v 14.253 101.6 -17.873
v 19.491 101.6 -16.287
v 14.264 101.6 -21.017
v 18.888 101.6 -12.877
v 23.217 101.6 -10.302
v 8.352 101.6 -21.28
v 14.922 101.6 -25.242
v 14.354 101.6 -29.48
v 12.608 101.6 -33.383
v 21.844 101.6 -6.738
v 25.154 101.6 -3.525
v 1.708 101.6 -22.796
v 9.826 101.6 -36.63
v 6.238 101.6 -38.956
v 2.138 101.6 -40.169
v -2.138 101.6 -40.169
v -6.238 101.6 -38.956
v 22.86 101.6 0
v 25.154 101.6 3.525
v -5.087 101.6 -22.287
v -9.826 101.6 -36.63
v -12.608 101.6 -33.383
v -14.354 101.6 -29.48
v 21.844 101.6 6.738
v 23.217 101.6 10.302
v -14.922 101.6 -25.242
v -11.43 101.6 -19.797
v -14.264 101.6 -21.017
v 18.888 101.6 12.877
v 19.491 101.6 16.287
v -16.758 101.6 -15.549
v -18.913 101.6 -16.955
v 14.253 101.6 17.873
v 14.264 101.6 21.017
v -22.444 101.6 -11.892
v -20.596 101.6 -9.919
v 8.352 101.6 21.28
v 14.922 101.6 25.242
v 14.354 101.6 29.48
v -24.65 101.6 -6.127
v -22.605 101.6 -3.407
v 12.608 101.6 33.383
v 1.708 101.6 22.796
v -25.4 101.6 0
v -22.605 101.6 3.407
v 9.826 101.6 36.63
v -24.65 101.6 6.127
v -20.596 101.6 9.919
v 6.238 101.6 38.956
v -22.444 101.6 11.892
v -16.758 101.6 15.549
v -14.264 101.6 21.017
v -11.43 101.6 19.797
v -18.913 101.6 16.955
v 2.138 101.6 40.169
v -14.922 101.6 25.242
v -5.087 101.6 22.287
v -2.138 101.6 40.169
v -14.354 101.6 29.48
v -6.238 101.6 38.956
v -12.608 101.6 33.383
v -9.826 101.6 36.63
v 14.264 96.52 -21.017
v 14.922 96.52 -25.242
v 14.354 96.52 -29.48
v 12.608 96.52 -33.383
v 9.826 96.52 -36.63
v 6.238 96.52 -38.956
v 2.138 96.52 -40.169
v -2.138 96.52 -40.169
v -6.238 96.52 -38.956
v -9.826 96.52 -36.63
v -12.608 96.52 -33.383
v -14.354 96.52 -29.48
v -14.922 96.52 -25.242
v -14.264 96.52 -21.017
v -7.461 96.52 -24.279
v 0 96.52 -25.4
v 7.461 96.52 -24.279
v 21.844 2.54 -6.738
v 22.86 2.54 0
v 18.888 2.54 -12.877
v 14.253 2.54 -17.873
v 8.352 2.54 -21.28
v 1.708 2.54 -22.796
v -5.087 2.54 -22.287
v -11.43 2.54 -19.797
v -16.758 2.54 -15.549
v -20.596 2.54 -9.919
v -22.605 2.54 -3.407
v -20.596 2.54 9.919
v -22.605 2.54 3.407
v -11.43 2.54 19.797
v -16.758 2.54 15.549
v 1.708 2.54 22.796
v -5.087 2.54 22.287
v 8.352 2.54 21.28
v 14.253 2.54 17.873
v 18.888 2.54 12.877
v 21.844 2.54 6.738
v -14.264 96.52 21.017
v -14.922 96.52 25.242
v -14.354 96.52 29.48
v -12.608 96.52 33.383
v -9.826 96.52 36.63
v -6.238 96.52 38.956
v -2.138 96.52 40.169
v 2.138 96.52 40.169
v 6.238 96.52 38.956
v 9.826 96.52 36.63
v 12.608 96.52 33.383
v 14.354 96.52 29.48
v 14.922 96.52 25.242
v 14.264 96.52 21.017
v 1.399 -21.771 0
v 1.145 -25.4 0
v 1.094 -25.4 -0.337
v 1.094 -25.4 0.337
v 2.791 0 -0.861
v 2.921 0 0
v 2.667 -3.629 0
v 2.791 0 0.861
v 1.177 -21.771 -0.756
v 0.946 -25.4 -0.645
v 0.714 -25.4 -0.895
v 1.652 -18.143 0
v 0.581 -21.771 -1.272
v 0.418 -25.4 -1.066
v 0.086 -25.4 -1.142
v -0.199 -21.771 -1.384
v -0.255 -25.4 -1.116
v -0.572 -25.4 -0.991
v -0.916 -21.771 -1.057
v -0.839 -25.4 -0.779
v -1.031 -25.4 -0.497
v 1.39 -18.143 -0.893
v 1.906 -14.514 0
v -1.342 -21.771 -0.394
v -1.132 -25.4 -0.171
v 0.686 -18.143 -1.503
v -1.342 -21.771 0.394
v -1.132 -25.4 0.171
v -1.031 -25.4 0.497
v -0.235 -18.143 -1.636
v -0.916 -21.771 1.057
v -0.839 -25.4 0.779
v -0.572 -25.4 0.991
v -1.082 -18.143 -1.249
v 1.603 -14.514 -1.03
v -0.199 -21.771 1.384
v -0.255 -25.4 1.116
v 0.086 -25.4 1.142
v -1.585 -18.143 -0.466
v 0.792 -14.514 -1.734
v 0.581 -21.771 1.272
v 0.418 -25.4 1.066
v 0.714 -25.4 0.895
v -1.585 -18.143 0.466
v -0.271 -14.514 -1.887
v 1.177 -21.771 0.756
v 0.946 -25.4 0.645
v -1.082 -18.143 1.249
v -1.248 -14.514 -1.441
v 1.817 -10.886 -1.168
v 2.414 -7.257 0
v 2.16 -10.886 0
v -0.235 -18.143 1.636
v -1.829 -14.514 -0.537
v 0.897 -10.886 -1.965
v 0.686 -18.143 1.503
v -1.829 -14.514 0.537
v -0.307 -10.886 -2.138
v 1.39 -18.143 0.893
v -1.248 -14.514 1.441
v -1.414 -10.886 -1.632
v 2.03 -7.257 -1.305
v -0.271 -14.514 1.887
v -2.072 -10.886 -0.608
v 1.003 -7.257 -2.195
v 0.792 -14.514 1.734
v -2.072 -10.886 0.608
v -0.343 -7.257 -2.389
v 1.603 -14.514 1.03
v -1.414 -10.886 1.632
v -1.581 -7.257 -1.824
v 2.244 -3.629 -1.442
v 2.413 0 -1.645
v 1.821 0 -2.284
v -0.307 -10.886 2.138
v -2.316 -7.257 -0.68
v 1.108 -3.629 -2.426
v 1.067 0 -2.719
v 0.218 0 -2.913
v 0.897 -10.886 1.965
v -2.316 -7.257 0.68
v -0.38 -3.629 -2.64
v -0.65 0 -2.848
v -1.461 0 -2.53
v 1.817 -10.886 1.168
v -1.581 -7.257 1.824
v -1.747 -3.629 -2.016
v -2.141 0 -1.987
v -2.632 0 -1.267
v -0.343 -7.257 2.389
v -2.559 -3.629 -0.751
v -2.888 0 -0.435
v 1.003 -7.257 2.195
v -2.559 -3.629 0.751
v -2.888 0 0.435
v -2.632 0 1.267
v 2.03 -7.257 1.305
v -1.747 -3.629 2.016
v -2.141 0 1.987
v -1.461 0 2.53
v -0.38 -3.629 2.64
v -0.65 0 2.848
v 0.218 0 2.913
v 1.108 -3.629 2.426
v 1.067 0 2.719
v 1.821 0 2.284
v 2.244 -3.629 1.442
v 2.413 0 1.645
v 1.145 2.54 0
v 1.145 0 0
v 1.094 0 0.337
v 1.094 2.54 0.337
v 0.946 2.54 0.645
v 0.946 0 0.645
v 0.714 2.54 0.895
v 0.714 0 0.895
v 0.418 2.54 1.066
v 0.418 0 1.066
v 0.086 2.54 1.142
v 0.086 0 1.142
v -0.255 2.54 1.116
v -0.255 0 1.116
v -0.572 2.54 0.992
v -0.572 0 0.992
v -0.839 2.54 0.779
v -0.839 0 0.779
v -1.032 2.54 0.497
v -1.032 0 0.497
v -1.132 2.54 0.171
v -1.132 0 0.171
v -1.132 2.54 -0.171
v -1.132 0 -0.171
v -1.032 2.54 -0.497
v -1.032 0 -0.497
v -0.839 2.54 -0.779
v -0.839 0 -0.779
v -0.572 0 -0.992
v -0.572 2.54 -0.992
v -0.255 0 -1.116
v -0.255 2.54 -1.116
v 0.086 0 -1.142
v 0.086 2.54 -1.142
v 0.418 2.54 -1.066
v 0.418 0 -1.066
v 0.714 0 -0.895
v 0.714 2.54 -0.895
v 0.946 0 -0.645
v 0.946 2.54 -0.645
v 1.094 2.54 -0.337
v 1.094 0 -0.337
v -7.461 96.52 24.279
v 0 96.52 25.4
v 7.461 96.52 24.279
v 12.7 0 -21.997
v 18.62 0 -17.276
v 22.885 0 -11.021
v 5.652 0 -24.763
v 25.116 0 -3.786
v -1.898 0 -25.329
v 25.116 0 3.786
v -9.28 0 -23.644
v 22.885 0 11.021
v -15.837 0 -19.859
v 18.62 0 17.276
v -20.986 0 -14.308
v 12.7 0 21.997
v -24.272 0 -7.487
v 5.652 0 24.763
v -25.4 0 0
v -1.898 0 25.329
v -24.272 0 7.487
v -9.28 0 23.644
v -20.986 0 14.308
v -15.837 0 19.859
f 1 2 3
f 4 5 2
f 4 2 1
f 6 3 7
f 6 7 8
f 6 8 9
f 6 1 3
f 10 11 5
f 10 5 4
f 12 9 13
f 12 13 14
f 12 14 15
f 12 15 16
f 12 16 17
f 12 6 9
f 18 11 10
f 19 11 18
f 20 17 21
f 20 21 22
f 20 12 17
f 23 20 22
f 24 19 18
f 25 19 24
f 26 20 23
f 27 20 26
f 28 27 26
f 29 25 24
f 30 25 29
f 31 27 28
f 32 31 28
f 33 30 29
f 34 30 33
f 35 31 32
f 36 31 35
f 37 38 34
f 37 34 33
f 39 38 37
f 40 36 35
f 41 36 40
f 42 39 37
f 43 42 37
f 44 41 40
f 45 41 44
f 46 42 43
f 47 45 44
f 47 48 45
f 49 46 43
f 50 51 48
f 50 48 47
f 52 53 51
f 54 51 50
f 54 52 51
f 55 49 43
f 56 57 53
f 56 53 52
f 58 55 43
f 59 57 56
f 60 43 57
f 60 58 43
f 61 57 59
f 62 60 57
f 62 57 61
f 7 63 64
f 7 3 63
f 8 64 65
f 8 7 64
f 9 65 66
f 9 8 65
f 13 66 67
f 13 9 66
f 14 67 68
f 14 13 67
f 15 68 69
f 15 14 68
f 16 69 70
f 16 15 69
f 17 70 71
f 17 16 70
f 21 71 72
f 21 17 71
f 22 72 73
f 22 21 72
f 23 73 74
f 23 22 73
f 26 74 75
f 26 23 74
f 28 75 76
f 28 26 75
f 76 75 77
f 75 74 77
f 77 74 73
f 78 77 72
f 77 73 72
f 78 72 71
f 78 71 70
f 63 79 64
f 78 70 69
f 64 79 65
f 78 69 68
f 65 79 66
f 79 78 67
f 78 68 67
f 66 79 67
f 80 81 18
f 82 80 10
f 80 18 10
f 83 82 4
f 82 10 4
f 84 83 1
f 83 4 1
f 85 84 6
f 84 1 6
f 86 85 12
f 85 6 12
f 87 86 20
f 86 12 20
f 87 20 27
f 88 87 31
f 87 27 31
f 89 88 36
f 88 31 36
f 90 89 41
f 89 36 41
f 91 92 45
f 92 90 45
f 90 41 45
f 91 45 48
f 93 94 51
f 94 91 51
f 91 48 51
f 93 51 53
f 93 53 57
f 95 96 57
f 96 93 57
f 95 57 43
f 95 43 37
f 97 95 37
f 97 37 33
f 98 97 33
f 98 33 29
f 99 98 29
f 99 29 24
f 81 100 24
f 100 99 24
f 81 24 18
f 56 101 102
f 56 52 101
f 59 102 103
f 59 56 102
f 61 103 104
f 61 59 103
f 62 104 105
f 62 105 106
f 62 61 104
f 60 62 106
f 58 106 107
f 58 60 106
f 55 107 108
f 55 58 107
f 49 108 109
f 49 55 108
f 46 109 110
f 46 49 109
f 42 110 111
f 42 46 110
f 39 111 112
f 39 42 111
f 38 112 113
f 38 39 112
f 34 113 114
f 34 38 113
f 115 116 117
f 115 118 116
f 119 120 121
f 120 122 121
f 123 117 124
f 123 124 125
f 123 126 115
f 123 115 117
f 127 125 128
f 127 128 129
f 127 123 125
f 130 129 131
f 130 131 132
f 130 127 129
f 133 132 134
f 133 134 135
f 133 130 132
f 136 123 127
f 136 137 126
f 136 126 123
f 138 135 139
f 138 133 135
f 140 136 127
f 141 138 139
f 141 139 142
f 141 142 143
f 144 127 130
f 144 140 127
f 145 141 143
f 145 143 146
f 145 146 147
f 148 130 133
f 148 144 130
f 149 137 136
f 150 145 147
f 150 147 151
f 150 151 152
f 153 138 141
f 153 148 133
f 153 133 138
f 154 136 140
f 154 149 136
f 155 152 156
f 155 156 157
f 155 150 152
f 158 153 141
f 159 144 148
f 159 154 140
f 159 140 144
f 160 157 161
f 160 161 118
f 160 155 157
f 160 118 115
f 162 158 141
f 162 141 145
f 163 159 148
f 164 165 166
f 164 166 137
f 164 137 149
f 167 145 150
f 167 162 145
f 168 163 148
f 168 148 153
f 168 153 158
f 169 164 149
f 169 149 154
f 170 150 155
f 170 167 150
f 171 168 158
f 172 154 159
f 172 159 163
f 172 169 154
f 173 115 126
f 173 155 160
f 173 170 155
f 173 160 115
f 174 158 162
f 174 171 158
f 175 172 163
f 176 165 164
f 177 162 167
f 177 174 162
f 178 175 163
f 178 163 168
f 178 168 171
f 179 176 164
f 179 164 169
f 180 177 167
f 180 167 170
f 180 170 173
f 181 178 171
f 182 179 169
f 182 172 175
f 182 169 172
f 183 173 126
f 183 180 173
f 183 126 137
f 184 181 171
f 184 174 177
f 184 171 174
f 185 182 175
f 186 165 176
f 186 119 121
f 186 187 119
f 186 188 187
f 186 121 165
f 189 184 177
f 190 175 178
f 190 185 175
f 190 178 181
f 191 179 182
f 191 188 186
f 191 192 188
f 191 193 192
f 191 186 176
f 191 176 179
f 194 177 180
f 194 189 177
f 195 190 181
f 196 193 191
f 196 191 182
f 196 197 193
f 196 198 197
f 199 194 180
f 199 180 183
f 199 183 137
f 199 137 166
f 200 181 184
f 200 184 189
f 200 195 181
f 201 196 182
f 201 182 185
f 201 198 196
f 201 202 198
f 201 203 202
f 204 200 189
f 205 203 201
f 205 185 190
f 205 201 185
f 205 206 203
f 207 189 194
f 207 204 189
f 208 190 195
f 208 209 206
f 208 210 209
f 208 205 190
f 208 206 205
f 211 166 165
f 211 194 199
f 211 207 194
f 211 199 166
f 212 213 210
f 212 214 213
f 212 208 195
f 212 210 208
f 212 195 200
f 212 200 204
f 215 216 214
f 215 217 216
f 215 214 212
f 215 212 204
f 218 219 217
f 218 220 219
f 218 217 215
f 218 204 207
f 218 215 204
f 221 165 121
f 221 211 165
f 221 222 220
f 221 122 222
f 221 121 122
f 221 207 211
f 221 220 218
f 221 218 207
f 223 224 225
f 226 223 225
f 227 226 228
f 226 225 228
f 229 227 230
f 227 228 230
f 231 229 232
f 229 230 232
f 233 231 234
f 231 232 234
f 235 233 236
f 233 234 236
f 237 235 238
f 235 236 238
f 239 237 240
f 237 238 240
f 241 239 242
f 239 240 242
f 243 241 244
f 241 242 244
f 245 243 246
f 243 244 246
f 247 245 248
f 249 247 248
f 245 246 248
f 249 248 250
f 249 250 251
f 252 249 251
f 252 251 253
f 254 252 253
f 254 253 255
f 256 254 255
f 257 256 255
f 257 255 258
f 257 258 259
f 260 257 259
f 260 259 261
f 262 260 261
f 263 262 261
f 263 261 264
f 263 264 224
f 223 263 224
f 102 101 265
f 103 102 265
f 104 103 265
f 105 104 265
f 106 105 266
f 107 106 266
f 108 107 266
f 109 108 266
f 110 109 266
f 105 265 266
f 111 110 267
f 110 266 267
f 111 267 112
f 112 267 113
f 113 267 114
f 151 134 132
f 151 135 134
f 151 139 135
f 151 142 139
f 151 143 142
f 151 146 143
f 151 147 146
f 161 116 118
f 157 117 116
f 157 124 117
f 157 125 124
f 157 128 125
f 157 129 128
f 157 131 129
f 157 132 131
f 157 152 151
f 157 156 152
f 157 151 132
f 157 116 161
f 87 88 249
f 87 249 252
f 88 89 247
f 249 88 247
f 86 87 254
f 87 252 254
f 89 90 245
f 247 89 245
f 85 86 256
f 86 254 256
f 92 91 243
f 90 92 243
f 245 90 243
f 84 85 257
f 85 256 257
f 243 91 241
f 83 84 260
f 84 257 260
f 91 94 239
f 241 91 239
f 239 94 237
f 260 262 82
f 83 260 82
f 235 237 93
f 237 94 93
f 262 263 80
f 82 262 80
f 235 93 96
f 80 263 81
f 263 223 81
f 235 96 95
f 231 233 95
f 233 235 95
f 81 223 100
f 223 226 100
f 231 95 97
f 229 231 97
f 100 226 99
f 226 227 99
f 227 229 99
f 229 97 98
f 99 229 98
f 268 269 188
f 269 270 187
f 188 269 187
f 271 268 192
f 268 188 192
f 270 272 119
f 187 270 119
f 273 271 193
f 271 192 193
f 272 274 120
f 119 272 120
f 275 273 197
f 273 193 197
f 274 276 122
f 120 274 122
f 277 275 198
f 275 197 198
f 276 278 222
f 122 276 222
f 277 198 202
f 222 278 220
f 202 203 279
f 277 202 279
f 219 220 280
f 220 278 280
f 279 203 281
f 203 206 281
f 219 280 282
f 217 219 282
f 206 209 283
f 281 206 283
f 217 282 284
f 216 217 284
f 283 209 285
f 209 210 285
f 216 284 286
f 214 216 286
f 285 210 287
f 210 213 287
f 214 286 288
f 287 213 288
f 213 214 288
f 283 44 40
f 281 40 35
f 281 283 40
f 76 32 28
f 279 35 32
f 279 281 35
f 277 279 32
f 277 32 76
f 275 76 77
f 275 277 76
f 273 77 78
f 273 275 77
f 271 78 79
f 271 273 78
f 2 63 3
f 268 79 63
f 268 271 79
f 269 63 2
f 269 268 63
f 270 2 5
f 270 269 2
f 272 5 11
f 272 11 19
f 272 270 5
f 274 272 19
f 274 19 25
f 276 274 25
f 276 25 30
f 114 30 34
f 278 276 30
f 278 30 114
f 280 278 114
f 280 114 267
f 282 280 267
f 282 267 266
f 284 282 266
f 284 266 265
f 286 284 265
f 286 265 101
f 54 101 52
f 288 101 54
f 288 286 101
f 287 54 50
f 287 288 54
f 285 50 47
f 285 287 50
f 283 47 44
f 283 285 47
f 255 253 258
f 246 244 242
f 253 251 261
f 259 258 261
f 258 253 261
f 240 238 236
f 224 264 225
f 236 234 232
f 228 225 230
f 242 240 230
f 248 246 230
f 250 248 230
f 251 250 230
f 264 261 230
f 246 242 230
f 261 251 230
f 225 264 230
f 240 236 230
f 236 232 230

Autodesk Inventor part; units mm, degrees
ref_plane "YZ Plane" through (0, 0, 0) normal (1, 0, 0) x (0, 1, 0)
ref_plane "XZ Plane" through (0, 0, 0) normal (0, 1, 0) x (-1, 0, 0)
ref_plane "XY Plane" through (0, 0, 0) normal (0, 0, 1) x (1, 0, 0)
sketch "Sketch1" plane through (0, 0, 0) normal (0, 1, 0) x (-1, 0, 0)
  circle A0 centre (0, 0) radius 25.4
  dimension "d0" = 50.8
extrude "Extrusion1" add sketch "Sketch1" along normal blind 101.6
sketch "Sketch2" plane through (0, 101.6, 0) normal (0, 1, 0) x (1, 0, 0)
  circle A0 centre (0, 0) radius 25.4 projected
  circle A1 centre (0, -25.4) radius 14.9225
  circle A2 centre (0, 25.4) radius 14.9225
  dimension "d3" = 29.845
  dimension "d4" = 29.845
extrude "Extrusion2" add sketch "Sketch2" against normal blind 5.08
sketch "Sketch3" plane through (0, 101.6, 0) normal (0, 1, 0) x (1, 0, 0)
  circle A0 centre (0, 0) radius 22.86
  dimension "d7" = 45.72
extrude "Extrusion3" cut sketch "Sketch3" against normal blind 195.072
sketch "Sketch4" plane through (0, 0, 0) normal (0, -1, 0) x (1, 0, 0)
  circle A0 centre (0, 0) radius 2.921
  dimension "d10" = 5.842
extrude "Extrusion4" add sketch "Sketch4" along normal blind 25.4 draft -4
sketch "Sketch5" plane through (0, 0, 0) normal (0, -1, 0) x (1, 0, 0)
  circle A0 centre (0, 0) radius 1.1449 projected
  circle A1 centre (0, 0) radius 22.86
extrude "Extrusion5" add sketch "Sketch5" against normal blind 2.54
properties part number "ReducedLargeSyrgine"
